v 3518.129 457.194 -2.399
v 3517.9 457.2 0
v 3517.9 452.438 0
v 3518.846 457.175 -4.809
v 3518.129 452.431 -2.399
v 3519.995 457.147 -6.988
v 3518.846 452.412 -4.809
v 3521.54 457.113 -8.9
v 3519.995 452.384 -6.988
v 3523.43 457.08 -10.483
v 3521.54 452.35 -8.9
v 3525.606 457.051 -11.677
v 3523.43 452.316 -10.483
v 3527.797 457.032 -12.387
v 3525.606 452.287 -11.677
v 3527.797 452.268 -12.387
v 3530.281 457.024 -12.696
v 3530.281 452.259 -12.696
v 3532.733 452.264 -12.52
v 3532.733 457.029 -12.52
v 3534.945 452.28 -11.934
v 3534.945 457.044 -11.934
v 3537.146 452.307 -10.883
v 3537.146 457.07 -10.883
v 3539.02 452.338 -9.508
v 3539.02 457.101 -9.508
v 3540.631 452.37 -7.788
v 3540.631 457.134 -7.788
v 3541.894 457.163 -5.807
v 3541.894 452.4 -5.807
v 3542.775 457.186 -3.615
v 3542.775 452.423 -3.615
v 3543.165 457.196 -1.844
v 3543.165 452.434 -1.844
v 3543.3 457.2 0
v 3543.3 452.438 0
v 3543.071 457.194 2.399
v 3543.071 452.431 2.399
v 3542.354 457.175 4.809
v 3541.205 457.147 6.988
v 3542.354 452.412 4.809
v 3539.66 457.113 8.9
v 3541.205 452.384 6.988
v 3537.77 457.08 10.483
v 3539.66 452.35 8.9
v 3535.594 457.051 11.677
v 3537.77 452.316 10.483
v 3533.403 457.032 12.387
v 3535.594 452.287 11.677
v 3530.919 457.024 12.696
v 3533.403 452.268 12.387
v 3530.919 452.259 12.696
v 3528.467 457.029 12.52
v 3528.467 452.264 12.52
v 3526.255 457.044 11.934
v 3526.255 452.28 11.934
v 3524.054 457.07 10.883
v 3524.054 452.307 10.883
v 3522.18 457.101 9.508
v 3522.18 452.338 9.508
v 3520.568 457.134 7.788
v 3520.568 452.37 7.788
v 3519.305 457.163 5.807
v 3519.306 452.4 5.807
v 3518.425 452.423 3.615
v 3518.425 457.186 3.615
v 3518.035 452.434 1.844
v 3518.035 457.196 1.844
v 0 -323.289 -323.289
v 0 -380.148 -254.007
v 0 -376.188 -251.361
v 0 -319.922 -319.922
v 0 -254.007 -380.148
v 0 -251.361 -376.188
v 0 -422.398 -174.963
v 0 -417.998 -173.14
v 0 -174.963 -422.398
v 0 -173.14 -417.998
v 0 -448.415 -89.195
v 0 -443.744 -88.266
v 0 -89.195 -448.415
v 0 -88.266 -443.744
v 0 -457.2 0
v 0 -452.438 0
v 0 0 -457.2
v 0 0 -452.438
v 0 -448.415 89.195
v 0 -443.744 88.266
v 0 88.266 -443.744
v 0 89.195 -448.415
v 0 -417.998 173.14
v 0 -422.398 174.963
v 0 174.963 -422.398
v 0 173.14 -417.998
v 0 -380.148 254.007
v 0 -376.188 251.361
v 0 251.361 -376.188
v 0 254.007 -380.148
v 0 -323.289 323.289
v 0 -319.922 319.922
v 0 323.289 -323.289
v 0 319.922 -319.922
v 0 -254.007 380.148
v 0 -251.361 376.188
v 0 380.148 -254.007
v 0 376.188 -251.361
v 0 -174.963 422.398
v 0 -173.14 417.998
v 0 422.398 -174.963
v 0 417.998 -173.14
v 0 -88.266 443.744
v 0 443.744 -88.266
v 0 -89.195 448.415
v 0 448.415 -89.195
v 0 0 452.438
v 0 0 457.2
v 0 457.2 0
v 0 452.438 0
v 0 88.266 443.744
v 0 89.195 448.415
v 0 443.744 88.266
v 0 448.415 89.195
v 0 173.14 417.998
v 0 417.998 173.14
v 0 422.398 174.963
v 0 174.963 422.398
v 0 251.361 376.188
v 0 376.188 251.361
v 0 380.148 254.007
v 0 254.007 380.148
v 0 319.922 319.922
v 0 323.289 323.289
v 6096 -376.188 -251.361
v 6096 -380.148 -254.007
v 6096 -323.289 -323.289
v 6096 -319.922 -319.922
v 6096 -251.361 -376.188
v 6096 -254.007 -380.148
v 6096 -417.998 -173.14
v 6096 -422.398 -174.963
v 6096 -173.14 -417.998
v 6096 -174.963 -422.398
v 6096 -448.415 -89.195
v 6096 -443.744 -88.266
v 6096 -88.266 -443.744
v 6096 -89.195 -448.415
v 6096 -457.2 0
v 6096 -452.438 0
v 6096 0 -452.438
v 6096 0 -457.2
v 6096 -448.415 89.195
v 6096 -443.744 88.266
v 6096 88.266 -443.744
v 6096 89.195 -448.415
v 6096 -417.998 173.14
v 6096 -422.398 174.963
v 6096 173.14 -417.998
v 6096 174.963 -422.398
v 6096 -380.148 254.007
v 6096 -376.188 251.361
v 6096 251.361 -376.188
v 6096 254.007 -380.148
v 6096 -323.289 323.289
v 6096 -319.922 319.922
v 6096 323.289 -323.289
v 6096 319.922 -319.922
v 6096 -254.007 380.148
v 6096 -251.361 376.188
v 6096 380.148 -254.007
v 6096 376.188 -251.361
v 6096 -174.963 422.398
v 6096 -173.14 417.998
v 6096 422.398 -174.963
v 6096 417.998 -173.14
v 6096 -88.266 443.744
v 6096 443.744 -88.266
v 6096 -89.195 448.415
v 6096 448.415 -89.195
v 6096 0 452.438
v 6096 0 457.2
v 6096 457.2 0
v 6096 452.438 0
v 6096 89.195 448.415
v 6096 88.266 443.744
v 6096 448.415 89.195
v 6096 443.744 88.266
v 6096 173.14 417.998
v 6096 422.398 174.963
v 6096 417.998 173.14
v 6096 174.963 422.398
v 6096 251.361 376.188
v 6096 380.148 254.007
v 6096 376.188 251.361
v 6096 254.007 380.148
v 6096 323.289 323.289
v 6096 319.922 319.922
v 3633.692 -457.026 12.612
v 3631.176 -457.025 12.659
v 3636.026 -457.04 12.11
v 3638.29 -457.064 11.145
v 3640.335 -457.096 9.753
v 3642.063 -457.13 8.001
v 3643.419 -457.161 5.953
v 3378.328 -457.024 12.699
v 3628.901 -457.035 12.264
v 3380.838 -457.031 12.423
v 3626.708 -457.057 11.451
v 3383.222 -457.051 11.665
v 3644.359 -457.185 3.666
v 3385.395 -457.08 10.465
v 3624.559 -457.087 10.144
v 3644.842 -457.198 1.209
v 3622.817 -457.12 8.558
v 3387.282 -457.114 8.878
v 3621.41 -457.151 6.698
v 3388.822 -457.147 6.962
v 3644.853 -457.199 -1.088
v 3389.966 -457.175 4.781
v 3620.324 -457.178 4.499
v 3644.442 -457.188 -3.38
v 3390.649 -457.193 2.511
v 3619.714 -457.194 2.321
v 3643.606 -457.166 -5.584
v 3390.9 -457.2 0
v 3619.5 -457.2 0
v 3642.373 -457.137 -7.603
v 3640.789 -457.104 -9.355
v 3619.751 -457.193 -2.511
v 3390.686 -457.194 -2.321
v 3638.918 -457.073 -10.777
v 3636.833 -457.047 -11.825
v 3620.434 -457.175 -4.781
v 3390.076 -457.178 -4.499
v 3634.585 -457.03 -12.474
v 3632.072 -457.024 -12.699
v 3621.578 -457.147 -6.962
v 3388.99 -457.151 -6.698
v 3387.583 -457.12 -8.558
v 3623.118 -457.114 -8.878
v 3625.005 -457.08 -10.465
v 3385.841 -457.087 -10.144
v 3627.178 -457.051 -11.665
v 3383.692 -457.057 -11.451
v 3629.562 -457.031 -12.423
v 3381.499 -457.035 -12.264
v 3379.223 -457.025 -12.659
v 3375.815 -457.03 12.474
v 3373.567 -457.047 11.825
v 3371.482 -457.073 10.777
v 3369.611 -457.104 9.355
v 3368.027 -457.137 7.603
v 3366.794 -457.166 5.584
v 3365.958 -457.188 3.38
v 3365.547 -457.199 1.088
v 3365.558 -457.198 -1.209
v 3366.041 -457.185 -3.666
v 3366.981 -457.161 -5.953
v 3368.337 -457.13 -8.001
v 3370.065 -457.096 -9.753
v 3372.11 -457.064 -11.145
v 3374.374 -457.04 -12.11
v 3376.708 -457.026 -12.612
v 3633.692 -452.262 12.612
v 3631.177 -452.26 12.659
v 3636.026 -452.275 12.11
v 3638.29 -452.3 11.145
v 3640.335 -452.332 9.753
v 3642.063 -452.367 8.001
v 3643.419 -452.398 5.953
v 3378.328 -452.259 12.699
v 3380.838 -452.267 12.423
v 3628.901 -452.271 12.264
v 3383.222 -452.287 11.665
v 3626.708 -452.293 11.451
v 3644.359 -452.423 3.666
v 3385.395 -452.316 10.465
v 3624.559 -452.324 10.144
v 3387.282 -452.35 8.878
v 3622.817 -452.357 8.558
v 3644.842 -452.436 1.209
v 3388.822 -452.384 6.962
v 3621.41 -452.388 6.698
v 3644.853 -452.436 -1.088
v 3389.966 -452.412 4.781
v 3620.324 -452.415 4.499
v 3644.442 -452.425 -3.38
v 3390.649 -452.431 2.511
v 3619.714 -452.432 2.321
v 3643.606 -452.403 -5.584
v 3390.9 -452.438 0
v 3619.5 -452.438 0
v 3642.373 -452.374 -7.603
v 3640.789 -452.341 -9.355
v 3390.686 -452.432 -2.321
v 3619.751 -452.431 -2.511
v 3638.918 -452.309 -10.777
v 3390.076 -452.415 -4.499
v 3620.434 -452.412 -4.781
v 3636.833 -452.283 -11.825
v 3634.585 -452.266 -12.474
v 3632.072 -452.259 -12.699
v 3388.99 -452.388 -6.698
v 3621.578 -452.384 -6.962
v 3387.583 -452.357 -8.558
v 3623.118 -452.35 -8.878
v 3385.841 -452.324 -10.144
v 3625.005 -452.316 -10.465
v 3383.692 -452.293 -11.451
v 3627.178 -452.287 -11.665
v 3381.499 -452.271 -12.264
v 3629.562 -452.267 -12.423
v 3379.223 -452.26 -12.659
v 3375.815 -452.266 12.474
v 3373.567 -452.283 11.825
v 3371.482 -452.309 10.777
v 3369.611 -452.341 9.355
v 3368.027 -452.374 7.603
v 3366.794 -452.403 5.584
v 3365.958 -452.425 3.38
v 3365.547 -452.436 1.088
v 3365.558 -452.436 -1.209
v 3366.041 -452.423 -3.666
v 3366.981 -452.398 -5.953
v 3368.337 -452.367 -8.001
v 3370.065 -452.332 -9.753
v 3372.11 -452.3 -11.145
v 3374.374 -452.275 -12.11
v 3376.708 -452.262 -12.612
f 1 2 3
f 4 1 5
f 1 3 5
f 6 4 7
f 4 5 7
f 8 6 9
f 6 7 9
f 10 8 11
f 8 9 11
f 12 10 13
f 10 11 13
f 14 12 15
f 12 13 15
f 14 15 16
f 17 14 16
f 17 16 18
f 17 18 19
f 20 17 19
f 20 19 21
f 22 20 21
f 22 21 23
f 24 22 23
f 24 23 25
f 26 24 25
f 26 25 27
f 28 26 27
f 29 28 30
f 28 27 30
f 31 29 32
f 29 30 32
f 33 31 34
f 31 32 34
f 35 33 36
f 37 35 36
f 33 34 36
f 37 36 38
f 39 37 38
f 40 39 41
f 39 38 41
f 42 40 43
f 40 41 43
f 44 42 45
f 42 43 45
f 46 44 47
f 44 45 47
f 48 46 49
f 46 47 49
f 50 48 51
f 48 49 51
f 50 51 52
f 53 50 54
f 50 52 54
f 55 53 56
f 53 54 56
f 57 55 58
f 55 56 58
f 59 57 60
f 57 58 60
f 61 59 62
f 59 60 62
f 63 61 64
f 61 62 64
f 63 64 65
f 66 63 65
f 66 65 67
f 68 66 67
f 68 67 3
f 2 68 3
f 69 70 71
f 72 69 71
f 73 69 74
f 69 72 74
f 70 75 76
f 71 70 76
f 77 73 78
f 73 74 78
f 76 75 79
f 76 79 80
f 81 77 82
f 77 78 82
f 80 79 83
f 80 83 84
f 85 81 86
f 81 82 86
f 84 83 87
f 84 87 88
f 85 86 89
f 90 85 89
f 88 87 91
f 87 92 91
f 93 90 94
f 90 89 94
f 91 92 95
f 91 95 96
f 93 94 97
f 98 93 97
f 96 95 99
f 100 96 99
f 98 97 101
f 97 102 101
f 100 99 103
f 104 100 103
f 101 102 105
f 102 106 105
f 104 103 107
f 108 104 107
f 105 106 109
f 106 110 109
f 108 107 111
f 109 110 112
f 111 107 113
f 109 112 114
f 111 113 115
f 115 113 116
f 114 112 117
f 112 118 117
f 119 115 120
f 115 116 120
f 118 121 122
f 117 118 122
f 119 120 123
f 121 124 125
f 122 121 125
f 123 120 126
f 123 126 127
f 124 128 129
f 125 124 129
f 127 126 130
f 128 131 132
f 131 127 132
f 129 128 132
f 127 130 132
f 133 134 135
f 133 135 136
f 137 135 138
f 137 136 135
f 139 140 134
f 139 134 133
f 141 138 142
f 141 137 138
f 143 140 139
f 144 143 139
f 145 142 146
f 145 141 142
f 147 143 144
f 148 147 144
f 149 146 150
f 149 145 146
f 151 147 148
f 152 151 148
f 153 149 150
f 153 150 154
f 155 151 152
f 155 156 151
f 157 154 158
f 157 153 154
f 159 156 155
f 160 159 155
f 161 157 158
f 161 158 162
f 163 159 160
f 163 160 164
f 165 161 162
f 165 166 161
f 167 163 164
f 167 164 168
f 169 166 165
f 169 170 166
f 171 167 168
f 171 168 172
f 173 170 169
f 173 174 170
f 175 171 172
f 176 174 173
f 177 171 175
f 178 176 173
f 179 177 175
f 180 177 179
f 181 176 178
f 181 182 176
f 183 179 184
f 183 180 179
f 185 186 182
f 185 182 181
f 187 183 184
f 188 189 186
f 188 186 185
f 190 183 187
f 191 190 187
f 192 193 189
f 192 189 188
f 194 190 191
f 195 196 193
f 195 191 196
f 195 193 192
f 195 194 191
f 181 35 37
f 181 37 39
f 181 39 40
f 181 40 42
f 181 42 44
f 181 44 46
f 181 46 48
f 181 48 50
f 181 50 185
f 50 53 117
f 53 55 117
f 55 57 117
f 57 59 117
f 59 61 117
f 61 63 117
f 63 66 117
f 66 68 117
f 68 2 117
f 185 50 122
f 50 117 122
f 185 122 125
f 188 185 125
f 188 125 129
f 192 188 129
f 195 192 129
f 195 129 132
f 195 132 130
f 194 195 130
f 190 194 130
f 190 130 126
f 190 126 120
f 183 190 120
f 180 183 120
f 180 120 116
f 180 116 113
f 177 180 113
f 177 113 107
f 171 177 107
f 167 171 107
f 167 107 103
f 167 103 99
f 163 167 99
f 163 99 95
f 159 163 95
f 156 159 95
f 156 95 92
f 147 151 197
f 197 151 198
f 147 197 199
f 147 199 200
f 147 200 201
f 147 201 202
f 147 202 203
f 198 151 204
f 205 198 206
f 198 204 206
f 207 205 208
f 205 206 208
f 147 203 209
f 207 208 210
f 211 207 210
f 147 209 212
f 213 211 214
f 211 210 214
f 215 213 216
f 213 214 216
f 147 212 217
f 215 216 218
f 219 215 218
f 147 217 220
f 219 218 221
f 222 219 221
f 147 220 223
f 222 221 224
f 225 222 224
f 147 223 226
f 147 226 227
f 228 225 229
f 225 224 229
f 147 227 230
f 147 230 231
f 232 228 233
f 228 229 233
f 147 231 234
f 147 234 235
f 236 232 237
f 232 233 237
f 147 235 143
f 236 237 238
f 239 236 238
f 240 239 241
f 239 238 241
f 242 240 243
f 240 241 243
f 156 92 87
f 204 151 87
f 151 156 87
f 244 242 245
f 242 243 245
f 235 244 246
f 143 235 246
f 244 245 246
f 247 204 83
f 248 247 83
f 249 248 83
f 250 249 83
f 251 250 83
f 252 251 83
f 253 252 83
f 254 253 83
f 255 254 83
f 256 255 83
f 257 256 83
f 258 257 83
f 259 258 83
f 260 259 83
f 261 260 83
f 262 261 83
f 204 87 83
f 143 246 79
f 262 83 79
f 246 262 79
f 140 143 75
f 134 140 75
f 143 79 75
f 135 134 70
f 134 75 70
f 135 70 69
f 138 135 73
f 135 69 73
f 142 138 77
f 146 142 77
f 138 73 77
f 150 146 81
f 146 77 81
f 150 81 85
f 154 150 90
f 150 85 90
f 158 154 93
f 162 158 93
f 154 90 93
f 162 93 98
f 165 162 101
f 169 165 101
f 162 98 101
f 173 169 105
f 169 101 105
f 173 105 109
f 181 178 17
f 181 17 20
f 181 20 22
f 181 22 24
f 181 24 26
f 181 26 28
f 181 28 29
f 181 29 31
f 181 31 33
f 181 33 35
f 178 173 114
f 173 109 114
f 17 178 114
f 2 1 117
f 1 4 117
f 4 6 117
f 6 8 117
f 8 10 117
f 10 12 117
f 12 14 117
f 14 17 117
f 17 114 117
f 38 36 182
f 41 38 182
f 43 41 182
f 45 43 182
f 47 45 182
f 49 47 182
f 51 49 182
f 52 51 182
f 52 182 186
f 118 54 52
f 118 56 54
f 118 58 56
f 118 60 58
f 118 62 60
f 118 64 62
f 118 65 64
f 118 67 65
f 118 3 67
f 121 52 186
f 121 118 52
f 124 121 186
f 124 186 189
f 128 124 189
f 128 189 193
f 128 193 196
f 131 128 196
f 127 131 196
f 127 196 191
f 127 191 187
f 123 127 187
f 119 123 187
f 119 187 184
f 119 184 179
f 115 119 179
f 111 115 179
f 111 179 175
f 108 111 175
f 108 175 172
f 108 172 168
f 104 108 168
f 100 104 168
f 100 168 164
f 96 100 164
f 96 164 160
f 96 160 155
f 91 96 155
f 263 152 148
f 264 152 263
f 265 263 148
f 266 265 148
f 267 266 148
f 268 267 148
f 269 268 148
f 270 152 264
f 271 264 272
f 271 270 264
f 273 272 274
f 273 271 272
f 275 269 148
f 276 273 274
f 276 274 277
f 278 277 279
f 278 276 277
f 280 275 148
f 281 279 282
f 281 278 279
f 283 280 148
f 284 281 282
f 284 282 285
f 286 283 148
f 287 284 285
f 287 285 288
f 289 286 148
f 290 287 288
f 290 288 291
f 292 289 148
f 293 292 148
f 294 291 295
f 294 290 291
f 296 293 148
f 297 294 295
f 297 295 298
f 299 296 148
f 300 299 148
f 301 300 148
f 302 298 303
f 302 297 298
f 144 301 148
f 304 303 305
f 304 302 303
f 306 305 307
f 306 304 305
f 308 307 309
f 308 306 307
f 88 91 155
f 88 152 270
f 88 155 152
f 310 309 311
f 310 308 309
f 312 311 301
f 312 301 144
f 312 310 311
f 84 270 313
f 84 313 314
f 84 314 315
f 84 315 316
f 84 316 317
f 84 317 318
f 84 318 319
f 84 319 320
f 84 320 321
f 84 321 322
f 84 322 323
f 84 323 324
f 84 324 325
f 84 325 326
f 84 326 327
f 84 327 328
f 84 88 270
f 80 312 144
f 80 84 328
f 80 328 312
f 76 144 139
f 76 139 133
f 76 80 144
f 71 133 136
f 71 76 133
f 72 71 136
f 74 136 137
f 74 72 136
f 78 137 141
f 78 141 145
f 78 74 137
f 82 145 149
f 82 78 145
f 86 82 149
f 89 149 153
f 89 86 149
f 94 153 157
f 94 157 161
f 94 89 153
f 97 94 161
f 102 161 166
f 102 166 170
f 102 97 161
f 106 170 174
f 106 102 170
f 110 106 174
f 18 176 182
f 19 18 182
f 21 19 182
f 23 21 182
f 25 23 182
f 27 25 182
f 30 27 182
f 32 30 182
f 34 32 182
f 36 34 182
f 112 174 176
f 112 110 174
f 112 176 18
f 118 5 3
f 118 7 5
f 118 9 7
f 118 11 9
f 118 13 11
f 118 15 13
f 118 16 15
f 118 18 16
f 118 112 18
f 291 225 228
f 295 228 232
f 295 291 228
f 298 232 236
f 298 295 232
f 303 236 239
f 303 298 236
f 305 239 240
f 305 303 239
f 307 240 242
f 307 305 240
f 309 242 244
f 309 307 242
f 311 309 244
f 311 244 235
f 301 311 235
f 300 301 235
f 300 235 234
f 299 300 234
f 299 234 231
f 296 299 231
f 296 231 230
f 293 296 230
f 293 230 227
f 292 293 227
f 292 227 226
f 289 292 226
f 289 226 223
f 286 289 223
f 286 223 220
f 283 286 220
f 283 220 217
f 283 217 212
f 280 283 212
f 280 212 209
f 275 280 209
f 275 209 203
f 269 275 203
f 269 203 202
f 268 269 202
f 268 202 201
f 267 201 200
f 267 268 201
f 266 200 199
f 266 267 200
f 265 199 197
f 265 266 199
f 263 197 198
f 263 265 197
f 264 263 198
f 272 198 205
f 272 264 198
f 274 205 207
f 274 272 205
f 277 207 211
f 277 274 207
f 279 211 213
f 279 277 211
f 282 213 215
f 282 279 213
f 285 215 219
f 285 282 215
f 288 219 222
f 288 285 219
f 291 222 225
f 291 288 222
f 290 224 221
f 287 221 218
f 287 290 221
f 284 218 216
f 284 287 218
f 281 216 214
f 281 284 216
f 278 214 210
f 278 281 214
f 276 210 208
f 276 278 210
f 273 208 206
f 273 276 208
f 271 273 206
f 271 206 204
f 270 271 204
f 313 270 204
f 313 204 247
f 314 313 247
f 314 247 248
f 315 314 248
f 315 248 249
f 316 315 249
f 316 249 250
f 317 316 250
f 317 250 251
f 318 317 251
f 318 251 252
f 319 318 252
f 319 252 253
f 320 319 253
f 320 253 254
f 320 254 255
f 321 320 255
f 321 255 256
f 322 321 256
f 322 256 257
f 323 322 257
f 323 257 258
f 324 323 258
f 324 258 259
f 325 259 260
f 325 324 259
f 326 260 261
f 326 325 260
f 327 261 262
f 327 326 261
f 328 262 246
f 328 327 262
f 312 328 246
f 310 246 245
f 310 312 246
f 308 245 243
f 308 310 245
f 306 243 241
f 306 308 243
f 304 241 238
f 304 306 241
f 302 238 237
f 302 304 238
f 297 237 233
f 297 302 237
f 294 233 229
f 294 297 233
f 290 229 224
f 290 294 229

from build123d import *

# Parameters (mm, degrees)
F0_R     = 457.2
F0_R_2   = 452.4375
F1_DEPTH = 6096
F3_DEPTH = 998.22
F4_DEPTH = 508


with BuildPart() as f1:
    # F0 (on Right) → F1 (new body)
    with BuildSketch(Plane.YZ):
        Circle(F0_R)
        Circle(F0_R_2, mode=Mode.SUBTRACT)
    extrude(amount=F1_DEPTH)

    # F2 (on Front) → F3 (cut)
    with BuildSketch(Plane.XZ):
        with BuildLine():
            Line((3378.2, 0), (3365.5, 0))
            ThreePointArc((3365.5, 0), (3378.2, -12.7), (3390.9, 0))
            Line((3390.9, 0), (3378.2, 0))
        make_face()
        with BuildLine():
            ThreePointArc((3390.9, 0), (3378.2, 12.7), (3365.5, 0))
            Line((3365.5, 0), (3378.2, 0))
            Line((3378.2, 0), (3390.9, 0))
        make_face()
        with BuildLine():
            ThreePointArc((3644.9, 0), (3632.2, 12.7), (3619.5, 0))
            ThreePointArc((3619.5, 0), (3632.2, -12.7), (3644.9, 0))
        make_face()
    extrude(amount=F3_DEPTH, mode=Mode.SUBTRACT)

    # F2 (on Front) → F4 (cut)
    with BuildSketch(Plane.XZ):
        with BuildLine():
            ThreePointArc((3543.3, 0), (3530.6, 12.7), (3517.9, 0))
            Line((3517.9, 0), (3530.6, 0))
            Line((3530.6, 0), (3543.3, 0))
        make_face()
        with BuildLine():
            Line((3530.6, 0), (3517.9, 0))
            ThreePointArc((3517.9, 0), (3530.6, -12.7), (3543.3, 0))
            Line((3543.3, 0), (3530.6, 0))
        make_face()
    extrude(amount=-F4_DEPTH, mode=Mode.SUBTRACT)


solid = f1.part
